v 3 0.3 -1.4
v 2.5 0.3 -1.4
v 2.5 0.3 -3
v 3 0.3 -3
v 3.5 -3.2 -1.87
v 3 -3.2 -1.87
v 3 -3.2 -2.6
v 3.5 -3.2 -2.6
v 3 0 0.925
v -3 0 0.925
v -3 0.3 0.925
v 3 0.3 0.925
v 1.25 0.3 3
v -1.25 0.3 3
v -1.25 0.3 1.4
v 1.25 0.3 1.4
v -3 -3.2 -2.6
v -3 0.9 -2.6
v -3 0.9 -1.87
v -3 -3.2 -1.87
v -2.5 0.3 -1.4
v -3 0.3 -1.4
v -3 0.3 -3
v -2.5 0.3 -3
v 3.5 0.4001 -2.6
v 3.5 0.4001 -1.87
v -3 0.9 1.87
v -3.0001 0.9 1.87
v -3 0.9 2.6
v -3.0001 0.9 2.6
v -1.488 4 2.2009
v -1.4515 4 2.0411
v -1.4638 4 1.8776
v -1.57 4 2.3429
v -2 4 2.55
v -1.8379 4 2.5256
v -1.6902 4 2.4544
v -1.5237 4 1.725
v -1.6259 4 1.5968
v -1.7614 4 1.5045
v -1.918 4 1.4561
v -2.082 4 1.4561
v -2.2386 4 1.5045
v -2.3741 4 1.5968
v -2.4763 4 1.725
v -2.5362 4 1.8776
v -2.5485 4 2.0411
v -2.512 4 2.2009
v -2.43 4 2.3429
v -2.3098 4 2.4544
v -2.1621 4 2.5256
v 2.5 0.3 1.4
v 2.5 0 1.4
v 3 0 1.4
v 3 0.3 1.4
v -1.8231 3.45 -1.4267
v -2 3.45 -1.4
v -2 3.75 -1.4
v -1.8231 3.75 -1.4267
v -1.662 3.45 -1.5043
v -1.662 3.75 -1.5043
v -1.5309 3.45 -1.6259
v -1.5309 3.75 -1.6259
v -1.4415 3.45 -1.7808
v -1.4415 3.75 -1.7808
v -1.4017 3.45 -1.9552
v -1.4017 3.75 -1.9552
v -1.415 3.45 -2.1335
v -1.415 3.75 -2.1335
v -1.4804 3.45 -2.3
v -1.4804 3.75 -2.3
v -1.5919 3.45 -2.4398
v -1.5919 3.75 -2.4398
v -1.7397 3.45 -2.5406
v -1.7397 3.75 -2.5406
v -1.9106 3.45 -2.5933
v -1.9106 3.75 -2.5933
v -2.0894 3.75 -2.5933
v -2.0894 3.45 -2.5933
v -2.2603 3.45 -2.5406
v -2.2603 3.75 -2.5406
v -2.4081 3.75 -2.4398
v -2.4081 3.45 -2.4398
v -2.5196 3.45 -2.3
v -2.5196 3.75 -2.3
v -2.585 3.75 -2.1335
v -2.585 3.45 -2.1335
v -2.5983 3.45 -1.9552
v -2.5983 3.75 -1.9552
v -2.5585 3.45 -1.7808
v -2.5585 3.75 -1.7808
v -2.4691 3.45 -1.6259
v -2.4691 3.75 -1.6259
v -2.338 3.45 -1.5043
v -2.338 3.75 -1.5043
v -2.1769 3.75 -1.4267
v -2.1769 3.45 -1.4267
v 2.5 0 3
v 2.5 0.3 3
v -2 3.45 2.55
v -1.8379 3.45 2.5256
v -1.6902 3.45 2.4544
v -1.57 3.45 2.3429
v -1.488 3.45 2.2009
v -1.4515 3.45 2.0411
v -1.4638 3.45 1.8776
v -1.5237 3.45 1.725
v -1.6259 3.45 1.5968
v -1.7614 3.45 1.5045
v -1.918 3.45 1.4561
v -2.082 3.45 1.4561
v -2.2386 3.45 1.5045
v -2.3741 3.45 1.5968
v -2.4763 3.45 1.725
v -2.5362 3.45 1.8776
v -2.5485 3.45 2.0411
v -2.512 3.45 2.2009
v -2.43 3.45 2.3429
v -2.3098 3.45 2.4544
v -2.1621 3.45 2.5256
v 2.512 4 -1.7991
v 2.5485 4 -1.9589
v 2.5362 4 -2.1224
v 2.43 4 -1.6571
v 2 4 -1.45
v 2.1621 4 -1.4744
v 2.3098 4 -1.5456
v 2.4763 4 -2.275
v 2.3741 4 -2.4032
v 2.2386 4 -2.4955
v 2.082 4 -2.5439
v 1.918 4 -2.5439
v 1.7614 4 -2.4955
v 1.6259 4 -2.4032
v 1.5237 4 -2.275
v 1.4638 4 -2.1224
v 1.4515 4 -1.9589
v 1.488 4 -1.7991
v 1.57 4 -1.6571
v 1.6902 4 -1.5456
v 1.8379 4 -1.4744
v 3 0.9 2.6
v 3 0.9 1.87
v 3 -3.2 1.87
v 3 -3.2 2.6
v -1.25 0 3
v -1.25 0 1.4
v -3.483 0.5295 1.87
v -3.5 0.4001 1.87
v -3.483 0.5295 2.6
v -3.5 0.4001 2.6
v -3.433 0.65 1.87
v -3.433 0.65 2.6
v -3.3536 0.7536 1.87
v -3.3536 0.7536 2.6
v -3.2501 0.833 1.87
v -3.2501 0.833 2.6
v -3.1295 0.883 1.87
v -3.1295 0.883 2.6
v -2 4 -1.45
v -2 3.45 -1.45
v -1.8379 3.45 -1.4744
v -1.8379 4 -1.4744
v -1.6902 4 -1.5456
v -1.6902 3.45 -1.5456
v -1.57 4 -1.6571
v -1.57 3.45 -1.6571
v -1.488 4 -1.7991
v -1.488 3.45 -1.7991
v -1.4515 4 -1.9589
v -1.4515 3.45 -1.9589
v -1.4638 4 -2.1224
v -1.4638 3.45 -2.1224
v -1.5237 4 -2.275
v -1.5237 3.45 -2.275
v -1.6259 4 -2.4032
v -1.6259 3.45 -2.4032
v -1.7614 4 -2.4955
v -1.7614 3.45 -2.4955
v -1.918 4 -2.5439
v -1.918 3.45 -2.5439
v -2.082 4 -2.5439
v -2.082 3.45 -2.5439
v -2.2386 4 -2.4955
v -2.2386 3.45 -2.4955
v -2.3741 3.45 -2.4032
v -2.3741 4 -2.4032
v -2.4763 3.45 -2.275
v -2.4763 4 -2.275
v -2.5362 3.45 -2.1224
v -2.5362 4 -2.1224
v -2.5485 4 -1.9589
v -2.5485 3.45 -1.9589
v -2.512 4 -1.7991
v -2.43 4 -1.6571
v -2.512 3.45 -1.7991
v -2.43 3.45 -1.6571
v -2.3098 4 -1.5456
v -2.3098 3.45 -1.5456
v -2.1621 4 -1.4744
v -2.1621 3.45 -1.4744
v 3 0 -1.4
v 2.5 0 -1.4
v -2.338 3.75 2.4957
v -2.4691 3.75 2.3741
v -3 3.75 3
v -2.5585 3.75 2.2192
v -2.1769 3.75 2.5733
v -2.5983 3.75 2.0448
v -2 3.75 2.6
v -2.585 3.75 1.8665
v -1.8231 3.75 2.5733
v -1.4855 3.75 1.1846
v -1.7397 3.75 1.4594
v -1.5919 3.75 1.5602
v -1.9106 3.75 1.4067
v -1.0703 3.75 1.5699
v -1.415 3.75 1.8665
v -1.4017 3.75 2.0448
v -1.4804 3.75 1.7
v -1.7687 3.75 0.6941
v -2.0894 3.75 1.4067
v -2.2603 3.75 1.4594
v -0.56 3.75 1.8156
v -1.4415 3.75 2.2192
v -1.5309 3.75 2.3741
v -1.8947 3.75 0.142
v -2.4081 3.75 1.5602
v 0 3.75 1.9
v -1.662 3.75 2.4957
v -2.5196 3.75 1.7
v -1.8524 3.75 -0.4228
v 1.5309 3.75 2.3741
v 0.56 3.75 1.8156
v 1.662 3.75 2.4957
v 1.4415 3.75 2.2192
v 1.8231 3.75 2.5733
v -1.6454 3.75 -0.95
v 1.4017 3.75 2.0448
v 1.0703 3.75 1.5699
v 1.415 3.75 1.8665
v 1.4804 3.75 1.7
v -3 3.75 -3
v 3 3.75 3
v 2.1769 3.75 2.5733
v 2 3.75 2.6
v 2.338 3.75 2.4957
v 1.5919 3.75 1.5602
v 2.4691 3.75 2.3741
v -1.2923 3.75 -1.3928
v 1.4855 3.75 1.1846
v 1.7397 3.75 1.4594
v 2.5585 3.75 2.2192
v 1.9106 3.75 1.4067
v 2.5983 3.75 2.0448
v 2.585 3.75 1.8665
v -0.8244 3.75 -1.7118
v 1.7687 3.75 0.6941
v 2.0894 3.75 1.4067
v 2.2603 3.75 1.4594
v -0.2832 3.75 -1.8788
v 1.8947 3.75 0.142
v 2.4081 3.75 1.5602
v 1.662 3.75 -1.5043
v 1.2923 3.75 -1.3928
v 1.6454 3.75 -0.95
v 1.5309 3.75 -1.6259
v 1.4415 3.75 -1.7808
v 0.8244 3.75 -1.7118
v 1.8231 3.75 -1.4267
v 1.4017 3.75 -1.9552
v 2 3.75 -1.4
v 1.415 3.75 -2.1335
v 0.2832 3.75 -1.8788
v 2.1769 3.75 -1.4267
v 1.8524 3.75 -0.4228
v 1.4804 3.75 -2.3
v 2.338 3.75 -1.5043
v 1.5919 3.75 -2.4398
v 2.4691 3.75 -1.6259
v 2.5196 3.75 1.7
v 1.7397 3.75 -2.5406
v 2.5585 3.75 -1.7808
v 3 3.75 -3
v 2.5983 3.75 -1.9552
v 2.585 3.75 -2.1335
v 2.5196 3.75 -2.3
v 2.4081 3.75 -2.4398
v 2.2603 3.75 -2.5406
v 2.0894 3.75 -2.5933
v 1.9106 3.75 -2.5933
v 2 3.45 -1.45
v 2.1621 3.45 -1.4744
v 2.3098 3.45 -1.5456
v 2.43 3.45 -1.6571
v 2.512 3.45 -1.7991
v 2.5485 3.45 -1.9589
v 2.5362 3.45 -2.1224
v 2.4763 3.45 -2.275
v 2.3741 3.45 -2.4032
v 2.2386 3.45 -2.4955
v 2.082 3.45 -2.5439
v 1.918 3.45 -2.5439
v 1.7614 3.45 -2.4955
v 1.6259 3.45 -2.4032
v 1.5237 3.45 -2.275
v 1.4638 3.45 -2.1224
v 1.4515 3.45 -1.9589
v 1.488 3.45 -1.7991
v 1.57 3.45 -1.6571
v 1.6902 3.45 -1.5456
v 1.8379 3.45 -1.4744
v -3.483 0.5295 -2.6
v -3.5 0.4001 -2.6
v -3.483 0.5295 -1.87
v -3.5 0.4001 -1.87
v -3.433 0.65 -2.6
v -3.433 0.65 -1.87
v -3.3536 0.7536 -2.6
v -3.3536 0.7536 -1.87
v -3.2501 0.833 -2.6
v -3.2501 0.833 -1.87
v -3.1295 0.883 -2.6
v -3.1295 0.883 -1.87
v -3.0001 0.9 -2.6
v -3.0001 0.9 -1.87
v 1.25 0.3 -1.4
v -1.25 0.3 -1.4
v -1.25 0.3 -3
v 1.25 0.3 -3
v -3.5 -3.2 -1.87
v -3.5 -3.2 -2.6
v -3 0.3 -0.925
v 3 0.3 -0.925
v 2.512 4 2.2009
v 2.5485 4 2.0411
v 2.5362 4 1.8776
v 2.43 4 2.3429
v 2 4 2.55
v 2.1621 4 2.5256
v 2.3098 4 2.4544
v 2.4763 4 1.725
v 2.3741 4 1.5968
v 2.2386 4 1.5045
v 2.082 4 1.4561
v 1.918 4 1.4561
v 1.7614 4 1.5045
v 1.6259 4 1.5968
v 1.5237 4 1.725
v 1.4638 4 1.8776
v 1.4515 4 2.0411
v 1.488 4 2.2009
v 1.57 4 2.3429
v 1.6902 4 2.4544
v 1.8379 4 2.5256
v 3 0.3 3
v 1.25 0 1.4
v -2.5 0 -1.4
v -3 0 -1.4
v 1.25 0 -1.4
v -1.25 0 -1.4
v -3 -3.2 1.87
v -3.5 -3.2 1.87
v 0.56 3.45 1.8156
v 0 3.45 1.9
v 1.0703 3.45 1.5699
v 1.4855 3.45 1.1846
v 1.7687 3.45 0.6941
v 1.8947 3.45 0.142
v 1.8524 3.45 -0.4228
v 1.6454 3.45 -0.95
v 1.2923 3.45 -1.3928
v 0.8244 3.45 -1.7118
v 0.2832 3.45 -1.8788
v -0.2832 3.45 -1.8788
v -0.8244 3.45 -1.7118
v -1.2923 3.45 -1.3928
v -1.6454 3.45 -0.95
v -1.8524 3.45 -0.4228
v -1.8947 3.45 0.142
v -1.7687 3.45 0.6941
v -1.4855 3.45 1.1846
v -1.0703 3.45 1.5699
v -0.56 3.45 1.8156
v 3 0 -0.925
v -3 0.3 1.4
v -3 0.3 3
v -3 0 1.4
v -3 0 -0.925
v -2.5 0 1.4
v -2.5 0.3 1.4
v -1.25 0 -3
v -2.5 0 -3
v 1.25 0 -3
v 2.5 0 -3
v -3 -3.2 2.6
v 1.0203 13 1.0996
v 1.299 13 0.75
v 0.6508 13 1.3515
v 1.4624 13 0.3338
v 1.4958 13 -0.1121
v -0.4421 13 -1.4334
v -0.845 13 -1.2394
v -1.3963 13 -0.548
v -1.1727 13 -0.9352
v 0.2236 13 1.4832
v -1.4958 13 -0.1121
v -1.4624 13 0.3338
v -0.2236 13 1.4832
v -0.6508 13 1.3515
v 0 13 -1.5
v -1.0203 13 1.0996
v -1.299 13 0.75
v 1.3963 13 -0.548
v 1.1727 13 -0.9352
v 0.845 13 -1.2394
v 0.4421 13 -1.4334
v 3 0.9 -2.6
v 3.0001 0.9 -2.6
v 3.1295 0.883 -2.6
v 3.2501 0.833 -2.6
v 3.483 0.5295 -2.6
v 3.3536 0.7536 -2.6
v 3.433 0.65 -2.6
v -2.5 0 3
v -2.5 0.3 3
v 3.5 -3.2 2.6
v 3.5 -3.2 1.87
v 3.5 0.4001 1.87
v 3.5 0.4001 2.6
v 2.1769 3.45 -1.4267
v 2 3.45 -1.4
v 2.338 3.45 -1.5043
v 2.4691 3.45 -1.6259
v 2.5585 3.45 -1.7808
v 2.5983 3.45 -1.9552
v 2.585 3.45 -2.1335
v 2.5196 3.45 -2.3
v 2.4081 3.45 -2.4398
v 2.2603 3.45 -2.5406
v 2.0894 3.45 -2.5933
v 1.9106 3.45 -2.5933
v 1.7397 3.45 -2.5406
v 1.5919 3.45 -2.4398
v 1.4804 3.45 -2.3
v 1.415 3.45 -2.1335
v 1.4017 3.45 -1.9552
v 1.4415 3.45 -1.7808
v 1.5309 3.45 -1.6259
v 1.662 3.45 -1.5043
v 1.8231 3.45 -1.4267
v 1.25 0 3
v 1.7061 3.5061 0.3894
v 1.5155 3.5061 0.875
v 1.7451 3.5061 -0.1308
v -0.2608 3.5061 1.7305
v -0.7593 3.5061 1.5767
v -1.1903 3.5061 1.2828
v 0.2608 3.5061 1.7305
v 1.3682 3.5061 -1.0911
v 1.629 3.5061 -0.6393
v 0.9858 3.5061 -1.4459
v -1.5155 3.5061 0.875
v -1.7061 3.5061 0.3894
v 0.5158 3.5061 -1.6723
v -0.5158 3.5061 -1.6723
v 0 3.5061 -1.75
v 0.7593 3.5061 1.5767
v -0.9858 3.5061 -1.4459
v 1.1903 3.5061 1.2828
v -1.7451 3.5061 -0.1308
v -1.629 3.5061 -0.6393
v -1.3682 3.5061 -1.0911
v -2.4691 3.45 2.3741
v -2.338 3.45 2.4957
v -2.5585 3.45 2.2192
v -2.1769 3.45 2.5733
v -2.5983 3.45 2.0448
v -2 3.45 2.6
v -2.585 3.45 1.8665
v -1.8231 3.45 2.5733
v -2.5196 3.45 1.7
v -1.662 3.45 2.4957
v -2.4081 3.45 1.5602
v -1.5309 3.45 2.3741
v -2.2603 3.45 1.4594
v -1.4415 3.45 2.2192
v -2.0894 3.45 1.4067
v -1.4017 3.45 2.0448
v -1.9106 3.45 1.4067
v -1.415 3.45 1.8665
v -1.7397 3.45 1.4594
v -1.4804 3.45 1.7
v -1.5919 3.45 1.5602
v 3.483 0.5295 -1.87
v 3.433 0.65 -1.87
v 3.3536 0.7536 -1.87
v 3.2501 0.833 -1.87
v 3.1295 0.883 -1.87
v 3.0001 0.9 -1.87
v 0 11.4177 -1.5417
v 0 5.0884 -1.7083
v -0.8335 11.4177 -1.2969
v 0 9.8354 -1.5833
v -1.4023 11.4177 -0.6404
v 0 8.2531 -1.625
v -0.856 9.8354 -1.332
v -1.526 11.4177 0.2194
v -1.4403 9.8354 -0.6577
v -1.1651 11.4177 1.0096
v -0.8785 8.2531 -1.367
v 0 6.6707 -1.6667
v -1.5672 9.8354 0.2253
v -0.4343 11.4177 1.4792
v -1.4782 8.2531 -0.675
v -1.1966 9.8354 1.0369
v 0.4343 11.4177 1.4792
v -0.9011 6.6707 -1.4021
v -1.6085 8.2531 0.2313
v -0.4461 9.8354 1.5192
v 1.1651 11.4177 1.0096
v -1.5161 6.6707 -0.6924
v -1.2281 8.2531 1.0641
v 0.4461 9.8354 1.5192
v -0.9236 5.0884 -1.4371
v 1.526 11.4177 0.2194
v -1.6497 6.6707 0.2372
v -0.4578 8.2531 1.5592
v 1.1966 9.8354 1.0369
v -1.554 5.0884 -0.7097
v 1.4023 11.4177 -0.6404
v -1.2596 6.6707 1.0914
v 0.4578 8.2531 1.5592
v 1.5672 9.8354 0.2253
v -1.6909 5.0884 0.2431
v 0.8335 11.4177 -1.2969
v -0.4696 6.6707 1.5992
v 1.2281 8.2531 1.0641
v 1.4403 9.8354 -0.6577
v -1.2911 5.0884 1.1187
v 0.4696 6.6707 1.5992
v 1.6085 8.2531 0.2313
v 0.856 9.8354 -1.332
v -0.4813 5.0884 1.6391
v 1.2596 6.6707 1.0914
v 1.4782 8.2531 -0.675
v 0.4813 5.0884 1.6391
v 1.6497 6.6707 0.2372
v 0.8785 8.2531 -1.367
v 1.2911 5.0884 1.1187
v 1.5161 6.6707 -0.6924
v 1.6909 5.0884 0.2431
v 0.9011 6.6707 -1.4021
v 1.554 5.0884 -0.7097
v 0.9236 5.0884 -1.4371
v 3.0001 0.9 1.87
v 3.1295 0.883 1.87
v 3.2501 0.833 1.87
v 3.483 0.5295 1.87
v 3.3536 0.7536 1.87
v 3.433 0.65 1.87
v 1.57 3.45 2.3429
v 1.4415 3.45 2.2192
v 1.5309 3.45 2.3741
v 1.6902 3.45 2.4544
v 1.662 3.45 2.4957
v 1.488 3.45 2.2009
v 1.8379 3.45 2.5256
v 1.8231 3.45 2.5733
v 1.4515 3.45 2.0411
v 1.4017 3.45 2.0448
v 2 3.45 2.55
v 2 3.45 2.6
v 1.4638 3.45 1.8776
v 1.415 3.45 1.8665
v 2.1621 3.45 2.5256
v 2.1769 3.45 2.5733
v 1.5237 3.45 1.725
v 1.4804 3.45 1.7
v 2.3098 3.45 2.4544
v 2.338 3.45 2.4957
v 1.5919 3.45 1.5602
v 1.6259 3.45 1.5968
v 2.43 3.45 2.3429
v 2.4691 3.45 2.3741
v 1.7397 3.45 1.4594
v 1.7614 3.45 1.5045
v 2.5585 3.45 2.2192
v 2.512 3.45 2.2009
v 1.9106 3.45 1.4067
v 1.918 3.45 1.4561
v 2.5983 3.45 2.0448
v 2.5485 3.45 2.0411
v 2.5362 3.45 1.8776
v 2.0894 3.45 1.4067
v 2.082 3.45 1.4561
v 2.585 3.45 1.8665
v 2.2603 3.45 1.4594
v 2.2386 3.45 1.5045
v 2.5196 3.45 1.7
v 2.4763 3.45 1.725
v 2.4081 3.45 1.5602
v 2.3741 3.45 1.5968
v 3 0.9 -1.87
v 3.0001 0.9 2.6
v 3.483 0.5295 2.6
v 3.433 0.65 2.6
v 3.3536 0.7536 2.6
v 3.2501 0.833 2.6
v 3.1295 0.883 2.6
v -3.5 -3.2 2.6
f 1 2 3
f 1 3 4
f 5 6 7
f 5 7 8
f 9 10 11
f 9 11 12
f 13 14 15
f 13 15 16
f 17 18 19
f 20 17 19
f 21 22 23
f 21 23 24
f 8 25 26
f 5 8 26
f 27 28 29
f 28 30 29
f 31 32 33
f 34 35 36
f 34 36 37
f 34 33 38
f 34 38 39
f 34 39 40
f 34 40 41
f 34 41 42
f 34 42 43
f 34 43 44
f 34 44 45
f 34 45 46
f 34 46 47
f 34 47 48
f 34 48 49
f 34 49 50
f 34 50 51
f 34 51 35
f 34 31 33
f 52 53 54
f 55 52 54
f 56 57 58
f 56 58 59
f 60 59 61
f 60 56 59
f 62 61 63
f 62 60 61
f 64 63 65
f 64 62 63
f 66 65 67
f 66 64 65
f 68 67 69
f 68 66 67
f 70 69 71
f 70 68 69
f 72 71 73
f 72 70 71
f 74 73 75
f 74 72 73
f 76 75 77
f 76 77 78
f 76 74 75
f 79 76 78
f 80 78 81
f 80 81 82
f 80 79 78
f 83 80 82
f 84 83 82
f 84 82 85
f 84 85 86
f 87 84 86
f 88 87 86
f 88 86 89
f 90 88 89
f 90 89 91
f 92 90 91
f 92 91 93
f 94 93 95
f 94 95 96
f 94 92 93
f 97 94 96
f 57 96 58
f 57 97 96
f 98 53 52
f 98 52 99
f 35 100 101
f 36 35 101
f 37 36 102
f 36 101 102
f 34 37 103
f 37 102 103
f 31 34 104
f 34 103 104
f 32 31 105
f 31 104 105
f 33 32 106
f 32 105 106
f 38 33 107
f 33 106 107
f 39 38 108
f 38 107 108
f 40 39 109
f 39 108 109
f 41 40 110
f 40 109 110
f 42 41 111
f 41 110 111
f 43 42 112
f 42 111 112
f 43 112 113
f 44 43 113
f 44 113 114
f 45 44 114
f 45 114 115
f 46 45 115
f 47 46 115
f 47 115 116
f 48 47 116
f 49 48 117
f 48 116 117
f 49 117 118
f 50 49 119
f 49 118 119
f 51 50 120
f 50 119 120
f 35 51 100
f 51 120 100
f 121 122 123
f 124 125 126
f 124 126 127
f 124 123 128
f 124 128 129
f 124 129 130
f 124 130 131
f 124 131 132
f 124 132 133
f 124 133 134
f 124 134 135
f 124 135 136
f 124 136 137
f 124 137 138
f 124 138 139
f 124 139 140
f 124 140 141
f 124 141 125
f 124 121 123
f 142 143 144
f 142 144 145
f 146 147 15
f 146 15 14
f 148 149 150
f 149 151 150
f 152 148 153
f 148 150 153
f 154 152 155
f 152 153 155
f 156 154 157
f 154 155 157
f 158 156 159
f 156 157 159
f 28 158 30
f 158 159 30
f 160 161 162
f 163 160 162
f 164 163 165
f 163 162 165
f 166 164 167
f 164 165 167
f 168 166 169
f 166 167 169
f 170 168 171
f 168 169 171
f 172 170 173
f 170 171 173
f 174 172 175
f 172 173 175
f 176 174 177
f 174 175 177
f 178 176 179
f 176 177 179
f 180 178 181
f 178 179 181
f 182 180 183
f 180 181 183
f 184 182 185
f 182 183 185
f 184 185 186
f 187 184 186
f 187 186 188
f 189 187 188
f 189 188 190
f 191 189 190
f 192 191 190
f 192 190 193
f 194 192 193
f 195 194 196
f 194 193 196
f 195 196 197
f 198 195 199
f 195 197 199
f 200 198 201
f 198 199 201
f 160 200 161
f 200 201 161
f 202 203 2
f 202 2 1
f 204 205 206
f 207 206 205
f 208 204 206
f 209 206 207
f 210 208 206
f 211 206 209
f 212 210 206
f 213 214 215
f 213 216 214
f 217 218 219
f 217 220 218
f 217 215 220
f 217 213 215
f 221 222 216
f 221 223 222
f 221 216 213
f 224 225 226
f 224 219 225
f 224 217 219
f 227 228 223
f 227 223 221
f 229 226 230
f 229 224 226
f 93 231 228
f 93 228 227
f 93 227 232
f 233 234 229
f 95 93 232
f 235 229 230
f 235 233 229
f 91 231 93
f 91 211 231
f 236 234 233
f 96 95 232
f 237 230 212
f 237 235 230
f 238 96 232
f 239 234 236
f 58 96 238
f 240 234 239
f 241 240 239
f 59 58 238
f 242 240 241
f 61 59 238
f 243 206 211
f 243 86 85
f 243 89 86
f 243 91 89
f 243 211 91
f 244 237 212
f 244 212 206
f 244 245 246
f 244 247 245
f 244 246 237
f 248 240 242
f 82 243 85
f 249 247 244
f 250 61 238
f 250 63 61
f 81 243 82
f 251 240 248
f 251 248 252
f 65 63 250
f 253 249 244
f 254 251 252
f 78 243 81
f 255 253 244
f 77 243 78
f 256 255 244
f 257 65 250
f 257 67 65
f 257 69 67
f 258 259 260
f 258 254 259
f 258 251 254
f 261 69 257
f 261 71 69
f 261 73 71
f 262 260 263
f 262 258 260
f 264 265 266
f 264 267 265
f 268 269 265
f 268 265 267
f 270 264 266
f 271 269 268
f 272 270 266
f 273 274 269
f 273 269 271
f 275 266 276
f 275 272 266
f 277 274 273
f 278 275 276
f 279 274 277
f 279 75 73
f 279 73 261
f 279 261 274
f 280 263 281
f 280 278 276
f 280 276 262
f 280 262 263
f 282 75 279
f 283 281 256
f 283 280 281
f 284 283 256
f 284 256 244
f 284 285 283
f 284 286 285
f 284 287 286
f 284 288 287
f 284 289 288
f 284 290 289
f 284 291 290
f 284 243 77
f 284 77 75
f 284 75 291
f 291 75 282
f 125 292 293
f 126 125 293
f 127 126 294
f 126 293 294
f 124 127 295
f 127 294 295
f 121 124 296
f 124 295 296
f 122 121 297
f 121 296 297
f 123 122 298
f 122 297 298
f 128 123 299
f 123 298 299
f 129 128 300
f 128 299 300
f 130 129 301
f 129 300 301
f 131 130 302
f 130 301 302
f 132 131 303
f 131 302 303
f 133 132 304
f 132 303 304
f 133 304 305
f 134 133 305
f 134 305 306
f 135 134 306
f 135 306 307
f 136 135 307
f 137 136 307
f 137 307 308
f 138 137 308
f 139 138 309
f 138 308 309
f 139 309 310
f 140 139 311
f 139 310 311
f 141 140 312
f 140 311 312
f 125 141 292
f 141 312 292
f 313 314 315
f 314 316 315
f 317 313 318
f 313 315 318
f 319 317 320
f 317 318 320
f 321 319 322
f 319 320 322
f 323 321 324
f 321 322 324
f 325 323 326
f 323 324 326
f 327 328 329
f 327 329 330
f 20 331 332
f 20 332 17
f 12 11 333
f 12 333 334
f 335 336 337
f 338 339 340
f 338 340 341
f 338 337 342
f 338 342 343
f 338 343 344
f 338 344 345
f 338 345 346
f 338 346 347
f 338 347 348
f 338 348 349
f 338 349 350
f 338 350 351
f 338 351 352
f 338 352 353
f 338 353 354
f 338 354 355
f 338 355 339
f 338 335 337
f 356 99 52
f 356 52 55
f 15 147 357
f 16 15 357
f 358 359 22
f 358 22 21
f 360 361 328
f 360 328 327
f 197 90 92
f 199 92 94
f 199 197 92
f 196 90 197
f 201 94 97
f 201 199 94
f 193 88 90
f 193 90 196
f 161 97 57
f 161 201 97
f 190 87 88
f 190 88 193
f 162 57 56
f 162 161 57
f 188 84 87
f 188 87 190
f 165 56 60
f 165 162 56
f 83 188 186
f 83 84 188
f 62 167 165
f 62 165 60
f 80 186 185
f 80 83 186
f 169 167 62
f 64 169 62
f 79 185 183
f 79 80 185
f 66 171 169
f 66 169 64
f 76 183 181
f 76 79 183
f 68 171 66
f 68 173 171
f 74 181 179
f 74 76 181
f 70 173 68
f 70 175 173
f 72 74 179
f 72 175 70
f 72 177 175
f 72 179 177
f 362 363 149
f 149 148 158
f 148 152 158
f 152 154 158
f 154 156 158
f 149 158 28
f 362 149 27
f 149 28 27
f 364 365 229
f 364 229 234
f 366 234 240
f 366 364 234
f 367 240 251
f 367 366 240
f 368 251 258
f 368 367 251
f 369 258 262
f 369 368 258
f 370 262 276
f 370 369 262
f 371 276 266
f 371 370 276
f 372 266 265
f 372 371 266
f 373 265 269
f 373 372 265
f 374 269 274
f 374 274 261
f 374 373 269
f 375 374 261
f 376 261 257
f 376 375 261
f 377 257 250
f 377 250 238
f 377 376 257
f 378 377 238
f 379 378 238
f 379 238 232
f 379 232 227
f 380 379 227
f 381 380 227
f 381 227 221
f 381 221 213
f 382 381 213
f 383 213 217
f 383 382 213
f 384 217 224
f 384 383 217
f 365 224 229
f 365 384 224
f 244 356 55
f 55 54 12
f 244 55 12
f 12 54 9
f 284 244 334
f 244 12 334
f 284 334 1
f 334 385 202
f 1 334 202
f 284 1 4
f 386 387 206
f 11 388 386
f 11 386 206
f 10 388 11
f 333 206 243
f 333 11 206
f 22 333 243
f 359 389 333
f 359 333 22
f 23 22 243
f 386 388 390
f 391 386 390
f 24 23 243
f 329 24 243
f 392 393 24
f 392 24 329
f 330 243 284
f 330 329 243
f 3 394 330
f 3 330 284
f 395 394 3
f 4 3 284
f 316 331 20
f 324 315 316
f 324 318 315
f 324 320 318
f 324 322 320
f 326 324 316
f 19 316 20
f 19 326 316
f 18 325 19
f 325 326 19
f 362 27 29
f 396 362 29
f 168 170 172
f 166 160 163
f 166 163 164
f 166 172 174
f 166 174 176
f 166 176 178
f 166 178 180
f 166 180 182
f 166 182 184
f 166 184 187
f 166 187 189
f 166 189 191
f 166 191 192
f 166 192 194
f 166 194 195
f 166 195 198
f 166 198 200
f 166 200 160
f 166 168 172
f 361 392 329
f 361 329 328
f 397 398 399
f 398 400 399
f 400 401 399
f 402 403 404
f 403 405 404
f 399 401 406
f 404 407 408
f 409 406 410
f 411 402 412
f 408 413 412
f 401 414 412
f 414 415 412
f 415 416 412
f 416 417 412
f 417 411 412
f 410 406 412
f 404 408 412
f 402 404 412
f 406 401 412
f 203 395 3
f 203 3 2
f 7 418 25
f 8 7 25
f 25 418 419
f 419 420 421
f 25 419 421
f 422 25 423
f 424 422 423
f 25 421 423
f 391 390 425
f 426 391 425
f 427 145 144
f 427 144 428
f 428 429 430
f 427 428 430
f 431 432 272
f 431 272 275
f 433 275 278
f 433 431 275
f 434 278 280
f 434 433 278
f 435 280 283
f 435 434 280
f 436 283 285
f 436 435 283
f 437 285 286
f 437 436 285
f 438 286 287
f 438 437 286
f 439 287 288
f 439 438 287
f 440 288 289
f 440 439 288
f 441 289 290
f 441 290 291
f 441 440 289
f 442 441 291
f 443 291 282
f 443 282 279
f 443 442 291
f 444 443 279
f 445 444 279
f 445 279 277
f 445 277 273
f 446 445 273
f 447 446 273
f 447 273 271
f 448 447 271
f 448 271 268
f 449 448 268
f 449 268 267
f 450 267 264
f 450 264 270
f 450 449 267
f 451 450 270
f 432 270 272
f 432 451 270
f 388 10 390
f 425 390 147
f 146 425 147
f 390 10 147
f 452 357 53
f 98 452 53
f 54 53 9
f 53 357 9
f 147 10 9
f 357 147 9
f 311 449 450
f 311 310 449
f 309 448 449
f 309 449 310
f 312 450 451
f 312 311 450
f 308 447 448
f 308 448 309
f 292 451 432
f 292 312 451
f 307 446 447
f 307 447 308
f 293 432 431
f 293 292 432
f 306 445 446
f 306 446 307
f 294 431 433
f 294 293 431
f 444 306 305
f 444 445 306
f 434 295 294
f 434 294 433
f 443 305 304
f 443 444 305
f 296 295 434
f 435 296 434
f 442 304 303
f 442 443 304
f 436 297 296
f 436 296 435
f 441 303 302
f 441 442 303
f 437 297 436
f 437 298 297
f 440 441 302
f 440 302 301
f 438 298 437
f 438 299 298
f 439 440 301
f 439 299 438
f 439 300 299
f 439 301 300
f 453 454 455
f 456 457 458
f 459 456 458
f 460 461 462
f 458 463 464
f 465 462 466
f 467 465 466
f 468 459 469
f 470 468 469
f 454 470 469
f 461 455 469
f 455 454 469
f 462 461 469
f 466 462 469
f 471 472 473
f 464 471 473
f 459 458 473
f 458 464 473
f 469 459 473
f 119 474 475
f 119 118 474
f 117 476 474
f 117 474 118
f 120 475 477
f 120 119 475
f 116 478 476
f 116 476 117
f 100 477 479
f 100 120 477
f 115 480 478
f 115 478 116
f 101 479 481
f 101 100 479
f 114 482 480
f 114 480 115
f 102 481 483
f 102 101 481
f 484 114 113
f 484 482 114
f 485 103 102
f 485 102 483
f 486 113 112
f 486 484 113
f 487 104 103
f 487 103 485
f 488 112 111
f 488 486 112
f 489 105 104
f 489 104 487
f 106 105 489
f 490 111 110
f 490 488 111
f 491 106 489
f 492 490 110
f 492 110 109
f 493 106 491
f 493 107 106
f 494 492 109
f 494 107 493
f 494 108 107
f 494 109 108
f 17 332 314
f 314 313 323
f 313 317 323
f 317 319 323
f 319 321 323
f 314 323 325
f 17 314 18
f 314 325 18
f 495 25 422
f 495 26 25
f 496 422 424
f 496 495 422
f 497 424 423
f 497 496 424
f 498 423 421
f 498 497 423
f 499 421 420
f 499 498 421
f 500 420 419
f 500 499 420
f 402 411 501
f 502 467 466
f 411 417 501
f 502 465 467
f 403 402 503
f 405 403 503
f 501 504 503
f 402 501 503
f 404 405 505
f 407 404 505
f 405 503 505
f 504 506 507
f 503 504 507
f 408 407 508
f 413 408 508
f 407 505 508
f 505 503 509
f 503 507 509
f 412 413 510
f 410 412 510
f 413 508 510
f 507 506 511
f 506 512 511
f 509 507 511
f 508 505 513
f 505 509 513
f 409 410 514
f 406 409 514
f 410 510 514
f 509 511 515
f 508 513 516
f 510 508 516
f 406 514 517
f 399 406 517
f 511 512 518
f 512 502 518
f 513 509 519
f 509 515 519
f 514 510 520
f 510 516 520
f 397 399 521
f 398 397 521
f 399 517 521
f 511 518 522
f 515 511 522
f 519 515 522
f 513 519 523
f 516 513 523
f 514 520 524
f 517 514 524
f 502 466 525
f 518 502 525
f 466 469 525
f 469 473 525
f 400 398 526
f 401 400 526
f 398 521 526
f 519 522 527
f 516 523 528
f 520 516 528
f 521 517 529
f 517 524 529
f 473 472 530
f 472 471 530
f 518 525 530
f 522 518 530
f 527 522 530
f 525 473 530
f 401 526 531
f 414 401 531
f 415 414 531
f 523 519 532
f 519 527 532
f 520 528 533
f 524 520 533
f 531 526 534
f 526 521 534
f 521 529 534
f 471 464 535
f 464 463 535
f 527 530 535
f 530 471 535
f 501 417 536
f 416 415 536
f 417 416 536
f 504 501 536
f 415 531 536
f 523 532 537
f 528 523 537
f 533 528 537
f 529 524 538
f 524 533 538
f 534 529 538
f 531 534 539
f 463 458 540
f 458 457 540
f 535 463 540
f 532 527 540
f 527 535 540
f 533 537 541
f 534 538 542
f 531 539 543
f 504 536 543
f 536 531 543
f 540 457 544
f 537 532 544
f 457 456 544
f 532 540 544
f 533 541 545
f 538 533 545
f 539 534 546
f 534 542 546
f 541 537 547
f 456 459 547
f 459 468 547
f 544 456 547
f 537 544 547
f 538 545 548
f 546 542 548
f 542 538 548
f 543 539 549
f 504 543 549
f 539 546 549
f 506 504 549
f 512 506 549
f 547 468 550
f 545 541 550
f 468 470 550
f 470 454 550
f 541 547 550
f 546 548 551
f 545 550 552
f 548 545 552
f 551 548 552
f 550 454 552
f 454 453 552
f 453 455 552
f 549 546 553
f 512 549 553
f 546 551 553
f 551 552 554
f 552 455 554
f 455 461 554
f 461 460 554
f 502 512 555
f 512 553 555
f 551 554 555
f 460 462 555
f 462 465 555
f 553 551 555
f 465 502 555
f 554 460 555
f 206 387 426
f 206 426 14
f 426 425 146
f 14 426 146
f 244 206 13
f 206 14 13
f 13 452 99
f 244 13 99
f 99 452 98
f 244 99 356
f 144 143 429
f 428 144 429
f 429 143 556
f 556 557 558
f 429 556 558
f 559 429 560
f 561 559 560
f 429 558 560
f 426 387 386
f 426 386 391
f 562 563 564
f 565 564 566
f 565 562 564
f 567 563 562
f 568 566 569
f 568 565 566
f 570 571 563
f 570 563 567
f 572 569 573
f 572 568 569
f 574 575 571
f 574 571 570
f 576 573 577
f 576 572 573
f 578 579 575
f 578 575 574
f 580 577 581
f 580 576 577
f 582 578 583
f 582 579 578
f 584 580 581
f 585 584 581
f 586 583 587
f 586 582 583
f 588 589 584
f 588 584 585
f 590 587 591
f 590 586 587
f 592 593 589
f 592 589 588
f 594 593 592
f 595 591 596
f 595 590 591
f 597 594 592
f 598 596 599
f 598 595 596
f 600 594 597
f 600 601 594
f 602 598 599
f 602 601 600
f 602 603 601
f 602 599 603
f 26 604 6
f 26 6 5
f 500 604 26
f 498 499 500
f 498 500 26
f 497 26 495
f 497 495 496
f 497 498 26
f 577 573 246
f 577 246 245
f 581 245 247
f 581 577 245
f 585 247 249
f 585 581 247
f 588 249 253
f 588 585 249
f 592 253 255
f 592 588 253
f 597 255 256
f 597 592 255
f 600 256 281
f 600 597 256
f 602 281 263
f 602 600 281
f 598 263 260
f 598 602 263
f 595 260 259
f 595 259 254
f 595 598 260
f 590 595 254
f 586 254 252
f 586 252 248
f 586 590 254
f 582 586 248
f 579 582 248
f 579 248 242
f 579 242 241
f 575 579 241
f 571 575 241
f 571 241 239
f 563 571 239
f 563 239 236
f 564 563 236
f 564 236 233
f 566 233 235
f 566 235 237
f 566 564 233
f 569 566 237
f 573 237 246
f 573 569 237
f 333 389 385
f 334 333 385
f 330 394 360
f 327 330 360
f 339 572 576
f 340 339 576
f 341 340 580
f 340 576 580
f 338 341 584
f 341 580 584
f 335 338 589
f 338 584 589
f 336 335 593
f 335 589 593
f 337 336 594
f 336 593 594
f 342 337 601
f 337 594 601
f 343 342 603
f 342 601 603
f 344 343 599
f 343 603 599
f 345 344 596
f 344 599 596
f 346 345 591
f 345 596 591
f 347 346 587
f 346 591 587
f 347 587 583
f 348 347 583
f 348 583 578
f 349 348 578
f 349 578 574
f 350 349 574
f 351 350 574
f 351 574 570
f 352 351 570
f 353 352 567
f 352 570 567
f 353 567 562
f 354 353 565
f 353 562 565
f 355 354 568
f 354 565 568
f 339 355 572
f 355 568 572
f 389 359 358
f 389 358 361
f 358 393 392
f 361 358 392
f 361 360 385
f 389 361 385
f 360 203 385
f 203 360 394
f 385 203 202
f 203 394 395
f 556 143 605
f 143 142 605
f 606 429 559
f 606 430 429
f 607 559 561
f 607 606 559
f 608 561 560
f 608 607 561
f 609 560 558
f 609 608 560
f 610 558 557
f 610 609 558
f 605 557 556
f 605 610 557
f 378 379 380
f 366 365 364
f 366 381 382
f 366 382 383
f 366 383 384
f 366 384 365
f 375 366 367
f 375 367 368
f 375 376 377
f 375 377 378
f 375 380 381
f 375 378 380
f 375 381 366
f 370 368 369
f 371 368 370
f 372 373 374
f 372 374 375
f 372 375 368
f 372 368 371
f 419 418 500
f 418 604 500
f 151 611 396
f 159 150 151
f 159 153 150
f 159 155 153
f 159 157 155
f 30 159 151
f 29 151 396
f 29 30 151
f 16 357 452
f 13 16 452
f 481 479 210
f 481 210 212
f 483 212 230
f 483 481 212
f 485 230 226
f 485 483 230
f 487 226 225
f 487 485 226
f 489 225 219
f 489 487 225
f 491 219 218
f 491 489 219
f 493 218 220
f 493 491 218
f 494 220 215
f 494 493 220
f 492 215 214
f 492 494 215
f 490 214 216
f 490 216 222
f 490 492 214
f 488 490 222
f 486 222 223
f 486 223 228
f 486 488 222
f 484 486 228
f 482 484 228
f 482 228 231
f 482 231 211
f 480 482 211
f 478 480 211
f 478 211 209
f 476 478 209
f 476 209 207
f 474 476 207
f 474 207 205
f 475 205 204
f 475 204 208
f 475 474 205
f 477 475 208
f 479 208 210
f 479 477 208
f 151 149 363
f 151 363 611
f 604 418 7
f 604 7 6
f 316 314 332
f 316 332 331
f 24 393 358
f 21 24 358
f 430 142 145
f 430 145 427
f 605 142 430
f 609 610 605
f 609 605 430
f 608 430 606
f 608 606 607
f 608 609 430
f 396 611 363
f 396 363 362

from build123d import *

# Parameters (mm, degrees)
SKETCH1_W                  = 6
SKETCH1_H                  = 6
BOSS_EXTRUDE1_DEPTH        = 3.45
SKETCH2_W                  = 6
SKETCH2_H                  = 6
SKETCH2_R                  = 0.6
SKETCH2_R_2                = 1.9
BOSS_EXTRUDE2_DEPTH        = 0.3
SKETCH3_R                  = 0.55
BOSS_EXTRUDE3_DEPTH        = 0.55
SKETCH5_W                  = 2.5
SKETCH5_H                  = 1.6
SKETCH5_W_2                = 6
SKETCH5_H_2                = 1.85
SKETCH5_W_3                = 0.5
CUT_EXTRUDE1_DEPTH         = 0.3
BOSS_EXTRUDE4_DEPTH        = 3.5
BOSS_EXTRUDE4_DEPTH_BACK   = 0.6
SKETCH6_W                  = 0.5
SKETCH6_H                  = 0.73
BOSS_EXTRUDE4_2_DEPTH      = 3.5
BOSS_EXTRUDE4_2_DEPTH_BACK = 0.6
BOSS_EXTRUDE4_3_DEPTH      = 3.5
BOSS_EXTRUDE4_3_DEPTH_BACK = 0.6
BOSS_EXTRUDE4_4_DEPTH      = 3.5
BOSS_EXTRUDE4_4_DEPTH_BACK = 0.6
FILLET1_R                  = 0.5
FILLET2_R                  = 0.5
FILLET3_R                  = 0.5
FILLET4_R                  = 0.5


with BuildPart() as part:
    # Sketch1 → Boss-Extrude1 (new body)
    with BuildSketch(Plane(origin=(0, 0, 0), x_dir=(1, 0, 0), z_dir=(0, 1, 0))):
        Rectangle(SKETCH1_W, SKETCH1_H)
    extrude(amount=BOSS_EXTRUDE1_DEPTH)



with BuildPart() as body_2:
    # Sketch2 → Boss-Extrude2 (new body)
    with BuildSketch(Plane(origin=(0, 3.45, 0), x_dir=(1, 0, 0), z_dir=(0, 1, 0))):
        Rectangle(SKETCH2_W, SKETCH2_H)
        with Locations(Location((-2, 2, 0), (0, 0, 270))):
            Circle(SKETCH2_R, mode=Mode.SUBTRACT)
        with Locations(Location((2, 2, 0), (0, 0, 270))):
            Circle(SKETCH2_R, mode=Mode.SUBTRACT)
        with Locations(Location((2, -2, 0), (0, 0, 270))):
            Circle(SKETCH2_R, mode=Mode.SUBTRACT)
        with Locations(Location((-2, -2, 0), (0, 0, 270))):
            Circle(SKETCH2_R, mode=Mode.SUBTRACT)
        with Locations(Location((0, 0, 0), (0, 0, 270))):
            Circle(SKETCH2_R_2, mode=Mode.SUBTRACT)
    extrude(amount=BOSS_EXTRUDE2_DEPTH)


with BuildPart() as part_1:
    add(part.part)

    add(body_2.part)  # Boss-Extrude3 merges body 2
    # Sketch3 → Boss-Extrude3 (add)
    with BuildSketch(Plane(origin=(0, 3.45, 0), x_dir=(1, 0, 0), z_dir=(0, 1, 0))):
        with Locations(Location((-2, 2, 0), (0, 0, 270))):
            Circle(SKETCH3_R)
        with Locations(Location((-2, -2, 0), (0, 0, 270))):
            Circle(SKETCH3_R)
        with Locations(Location((2, 2, 0), (0, 0, 270))):
            Circle(SKETCH3_R)
        with Locations(Location((2, -2, 0), (0, 0, 270))):
            Circle(SKETCH3_R)
    extrude(amount=BOSS_EXTRUDE3_DEPTH)

    # Sketch5 → Cut-Extrude1 (cut)
    with BuildSketch(Plane.XZ):
        with Locations((0, 2.2)):
            Rectangle(SKETCH5_W, SKETCH5_H)
        Rectangle(SKETCH5_W_2, SKETCH5_H_2)
        with Locations((-2.75, 2.2)):
            Rectangle(SKETCH5_W_3, SKETCH5_H)
        with Locations((2.75, 2.2)):
            Rectangle(SKETCH5_W_3, SKETCH5_H)
        with Locations((2.75, -2.2)):
            Rectangle(SKETCH5_W_3, SKETCH5_H)
        with Locations((-2.75, -2.2)):
            Rectangle(SKETCH5_W_3, SKETCH5_H)
        with Locations((0, -2.2)):
            Rectangle(SKETCH5_W, SKETCH5_H)
    extrude(amount=-CUT_EXTRUDE1_DEPTH, mode=Mode.SUBTRACT)


with BuildPart() as body_2_2:
    # Sketch4 → Revolve1 (revolve)
    with BuildSketch(Plane.XY, mode=Mode.PRIVATE) as revolve1_sk:
        Polygon((0, 13), (-1.5, 13), (-1.75, 3.506112458), (0, 3.506112458), align=None)
    revolve(revolve1_sk.sketch.rotate(Axis((0, 0, 0), (0, 1, 0)), 270), axis=Axis((0, 0, 0), (0, 1, 0)))


with BuildPart() as body_3:
    # Sketch6 → Boss-Extrude4 (new, two sides: drawn at the far end of the back side and taken through both)
    with BuildSketch(Plane.XZ.offset(-0.3).offset(-BOSS_EXTRUDE4_DEPTH_BACK)):
        with Locations((-3.25, 2.235)):
            Rectangle(SKETCH6_W, SKETCH6_H)
    extrude(amount=BOSS_EXTRUDE4_DEPTH + BOSS_EXTRUDE4_DEPTH_BACK)

    # Fillet1
    fillet1_edges = [body_3.edges().sort_by_distance(p)[0] for p in [
        (-3.5, 0.9, 2.235),
    ]]
    fillet(fillet1_edges, radius=FILLET1_R - 0.0001)  # a hair under: the kernel refuses the full size


with BuildPart() as body_4:
    # Sketch6 → Boss-Extrude4 2 (new, two sides: drawn at the far end of the back side and taken through both)
    with BuildSketch(Plane.XZ.offset(-0.3).offset(-BOSS_EXTRUDE4_2_DEPTH_BACK)):
        with Locations((3.25, 2.235)):
            Rectangle(SKETCH6_W, SKETCH6_H)
    extrude(amount=BOSS_EXTRUDE4_2_DEPTH + BOSS_EXTRUDE4_2_DEPTH_BACK)

    # Fillet3
    fillet3_edges = [body_4.edges().sort_by_distance(p)[0] for p in [
        (3.5, 0.9, 2.235),
    ]]
    fillet(fillet3_edges, radius=FILLET3_R - 0.0001)  # a hair under: the kernel refuses the full size


with BuildPart() as body_5:
    # Sketch6 → Boss-Extrude4 3 (new, two sides: drawn at the far end of the back side and taken through both)
    with BuildSketch(Plane.XZ.offset(-0.3).offset(-BOSS_EXTRUDE4_3_DEPTH_BACK)):
        with Locations((3.25, -2.235)):
            Rectangle(SKETCH6_W, SKETCH6_H)
    extrude(amount=BOSS_EXTRUDE4_3_DEPTH + BOSS_EXTRUDE4_3_DEPTH_BACK)

    # Fillet4
    fillet4_edges = [body_5.edges().sort_by_distance(p)[0] for p in [
        (3.5, 0.9, -2.235),
    ]]
    fillet(fillet4_edges, radius=FILLET4_R - 0.0001)  # a hair under: the kernel refuses the full size


with BuildPart() as body_6:
    # Sketch6 → Boss-Extrude4 4 (new, two sides: drawn at the far end of the back side and taken through both)
    with BuildSketch(Plane.XZ.offset(-0.3).offset(-BOSS_EXTRUDE4_4_DEPTH_BACK)):
        with Locations((-3.25, -2.235)):
            Rectangle(SKETCH6_W, SKETCH6_H)
    extrude(amount=BOSS_EXTRUDE4_4_DEPTH + BOSS_EXTRUDE4_4_DEPTH_BACK)

    # Fillet2
    fillet2_edges = [body_6.edges().sort_by_distance(p)[0] for p in [
        (-3.5, 0.9, -2.235),
    ]]
    fillet(fillet2_edges, radius=FILLET2_R - 0.0001)  # a hair under: the kernel refuses the full size


solid = Compound([part_1.part, body_2_2.part, body_3.part, body_4.part, body_5.part, body_6.part])
